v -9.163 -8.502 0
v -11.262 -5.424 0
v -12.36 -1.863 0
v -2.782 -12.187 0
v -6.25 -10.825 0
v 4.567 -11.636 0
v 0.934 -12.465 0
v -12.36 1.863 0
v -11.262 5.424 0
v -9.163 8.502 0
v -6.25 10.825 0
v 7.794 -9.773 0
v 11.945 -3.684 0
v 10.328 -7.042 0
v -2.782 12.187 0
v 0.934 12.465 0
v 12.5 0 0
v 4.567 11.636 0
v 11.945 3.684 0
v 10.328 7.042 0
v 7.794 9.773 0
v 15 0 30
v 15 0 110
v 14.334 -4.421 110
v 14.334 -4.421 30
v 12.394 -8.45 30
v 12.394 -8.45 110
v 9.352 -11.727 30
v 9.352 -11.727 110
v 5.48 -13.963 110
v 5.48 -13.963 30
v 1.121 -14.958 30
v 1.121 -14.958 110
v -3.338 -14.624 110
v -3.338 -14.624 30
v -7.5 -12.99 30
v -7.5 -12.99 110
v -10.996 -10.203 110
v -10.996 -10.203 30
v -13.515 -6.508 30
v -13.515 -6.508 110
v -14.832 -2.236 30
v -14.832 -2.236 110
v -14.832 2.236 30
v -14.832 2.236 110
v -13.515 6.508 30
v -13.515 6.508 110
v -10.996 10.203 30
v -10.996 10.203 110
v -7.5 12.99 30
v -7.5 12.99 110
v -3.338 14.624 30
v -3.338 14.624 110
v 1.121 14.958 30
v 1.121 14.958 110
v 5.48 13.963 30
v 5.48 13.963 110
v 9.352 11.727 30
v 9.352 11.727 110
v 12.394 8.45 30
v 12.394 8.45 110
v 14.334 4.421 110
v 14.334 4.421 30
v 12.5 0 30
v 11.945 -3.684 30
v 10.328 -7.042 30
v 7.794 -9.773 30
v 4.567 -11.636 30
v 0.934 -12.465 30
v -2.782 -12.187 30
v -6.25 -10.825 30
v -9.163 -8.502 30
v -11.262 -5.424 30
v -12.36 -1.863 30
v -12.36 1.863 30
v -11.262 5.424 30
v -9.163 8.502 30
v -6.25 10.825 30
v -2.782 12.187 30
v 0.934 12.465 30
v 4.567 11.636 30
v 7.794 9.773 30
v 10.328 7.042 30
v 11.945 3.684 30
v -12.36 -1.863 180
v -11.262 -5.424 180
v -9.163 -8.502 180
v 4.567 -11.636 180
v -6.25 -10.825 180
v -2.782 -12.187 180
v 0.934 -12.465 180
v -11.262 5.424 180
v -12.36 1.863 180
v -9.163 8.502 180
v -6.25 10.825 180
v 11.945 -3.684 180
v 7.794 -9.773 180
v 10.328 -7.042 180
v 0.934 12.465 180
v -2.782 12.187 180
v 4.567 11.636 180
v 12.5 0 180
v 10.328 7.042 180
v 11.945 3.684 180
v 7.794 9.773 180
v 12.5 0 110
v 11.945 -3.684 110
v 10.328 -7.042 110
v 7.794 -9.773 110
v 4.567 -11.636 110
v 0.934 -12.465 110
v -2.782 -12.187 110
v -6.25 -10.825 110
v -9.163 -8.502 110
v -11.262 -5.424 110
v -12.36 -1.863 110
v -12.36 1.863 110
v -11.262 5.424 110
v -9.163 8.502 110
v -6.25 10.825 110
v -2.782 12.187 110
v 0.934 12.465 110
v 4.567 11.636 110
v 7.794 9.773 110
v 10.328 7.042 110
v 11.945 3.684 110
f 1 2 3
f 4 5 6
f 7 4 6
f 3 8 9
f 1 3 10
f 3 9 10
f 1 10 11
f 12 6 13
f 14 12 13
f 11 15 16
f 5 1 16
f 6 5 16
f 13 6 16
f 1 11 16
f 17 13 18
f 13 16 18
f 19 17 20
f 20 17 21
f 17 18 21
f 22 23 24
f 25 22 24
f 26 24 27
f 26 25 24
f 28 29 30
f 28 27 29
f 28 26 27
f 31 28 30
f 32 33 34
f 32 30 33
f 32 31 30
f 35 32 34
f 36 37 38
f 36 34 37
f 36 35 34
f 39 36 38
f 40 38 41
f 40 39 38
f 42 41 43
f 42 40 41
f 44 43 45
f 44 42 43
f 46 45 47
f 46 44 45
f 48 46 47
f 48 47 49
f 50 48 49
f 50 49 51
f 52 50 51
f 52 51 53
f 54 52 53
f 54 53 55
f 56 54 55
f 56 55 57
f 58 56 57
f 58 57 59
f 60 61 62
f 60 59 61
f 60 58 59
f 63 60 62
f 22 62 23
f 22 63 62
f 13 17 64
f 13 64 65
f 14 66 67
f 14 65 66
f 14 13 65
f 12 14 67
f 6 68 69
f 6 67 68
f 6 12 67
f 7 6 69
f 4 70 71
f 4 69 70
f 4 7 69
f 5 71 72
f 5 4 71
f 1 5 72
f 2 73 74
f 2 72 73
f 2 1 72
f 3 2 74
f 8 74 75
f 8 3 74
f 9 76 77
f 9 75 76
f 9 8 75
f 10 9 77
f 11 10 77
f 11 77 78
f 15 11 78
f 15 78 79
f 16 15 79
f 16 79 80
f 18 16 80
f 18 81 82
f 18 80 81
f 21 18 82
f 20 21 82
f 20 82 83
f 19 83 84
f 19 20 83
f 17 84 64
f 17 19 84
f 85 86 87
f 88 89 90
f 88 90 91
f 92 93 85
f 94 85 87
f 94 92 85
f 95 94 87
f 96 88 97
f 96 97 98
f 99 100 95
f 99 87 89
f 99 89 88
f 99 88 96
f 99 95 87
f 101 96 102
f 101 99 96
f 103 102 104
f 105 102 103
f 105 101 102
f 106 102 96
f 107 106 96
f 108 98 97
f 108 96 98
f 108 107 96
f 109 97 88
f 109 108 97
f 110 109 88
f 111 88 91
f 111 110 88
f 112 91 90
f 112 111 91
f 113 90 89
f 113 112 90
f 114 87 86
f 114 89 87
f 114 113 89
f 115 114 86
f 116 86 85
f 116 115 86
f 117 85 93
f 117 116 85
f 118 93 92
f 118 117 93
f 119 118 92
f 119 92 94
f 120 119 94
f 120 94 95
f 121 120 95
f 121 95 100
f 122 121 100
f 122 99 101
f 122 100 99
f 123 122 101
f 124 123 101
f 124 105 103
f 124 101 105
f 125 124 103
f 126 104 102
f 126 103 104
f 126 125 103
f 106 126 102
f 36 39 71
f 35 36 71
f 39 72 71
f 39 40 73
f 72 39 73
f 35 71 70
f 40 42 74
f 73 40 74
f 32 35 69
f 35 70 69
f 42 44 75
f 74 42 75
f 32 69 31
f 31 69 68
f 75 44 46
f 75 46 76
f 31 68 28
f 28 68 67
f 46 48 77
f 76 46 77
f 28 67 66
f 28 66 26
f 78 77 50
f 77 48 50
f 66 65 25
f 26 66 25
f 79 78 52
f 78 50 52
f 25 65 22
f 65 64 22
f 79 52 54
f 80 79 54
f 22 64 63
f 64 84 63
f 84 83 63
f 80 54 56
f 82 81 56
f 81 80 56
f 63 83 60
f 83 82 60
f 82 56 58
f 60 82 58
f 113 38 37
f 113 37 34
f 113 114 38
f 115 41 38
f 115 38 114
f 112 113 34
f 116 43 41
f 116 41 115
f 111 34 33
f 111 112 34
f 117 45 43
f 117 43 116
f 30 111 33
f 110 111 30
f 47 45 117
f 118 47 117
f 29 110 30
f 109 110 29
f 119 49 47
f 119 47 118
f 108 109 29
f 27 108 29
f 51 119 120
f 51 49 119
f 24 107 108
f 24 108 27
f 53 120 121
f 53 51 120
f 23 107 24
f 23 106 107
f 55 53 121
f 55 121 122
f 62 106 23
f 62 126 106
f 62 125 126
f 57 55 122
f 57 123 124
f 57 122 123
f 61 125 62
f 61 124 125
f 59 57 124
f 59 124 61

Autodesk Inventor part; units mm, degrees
ref_plane "YZ Plane" through (0, 0, 0) normal (1, 0, 0) x (0, 1, 0)
ref_plane "XZ Plane" through (0, 0, 0) normal (0, 1, 0) x (-1, 0, 0)
ref_plane "XY Plane" through (0, 0, 0) normal (0, 0, 1) x (1, 0, 0)
sketch "Náčrt1" plane through (0, 0, 0) normal (0, 0, 1) x (1, 0, 0)
  circle A0 centre (0, 0) radius 12.5
  dimension "d0" = 25
extrude "Vysunutí1" add sketch "Náčrt1" along normal blind 30
sketch "Náčrt2" plane through (0, 0, 30) normal (0, 0, 1) x (1, 0, 0)
  circle A0 centre (0, 0) radius 15
  dimension "d3" = 30
extrude "Vysunutí2" add sketch "Náčrt2" along normal blind 80
sketch "Náčrt3" plane through (0, 0, 110) normal (0, 0, 1) x (1, 0, 0)
  circle A0 centre (0, 0) radius 12.5
  dimension "d6" = 25
extrude "Vysunutí3" add sketch "Náčrt3" along normal blind 70
sketch "Náčrt4" plane through (0, 0, 0) normal (1, 0, 0) x (0, 1, 0)
  point P0 (0, 0)
sketch "Náčrt5" plane through (0, 0, 0) normal (0, 1, 0) x (-1, 0, 0)
  line L0 (0, -36) -> (0, 216) construction
  arc A0 (-4, 38.6) -> (4, 38.6) centre (0, 38.6) ccw
  line L1 (-15, 30) -> (15, 30) construction
  arc A1 (4, 70.6) -> (-4, 70.6) centre (0, 70.6) ccw
  line L2 (4, 70.6) -> (4, 38.6)
  line L3 (-4, 70.6) -> (-4, 38.6)
  point P0 (0, 0)
  dimension "d9" = 8
  dimension "d10" = 8.6
  dimension "d11" = 8
  dimension "d12" = 32
properties part number "Součást3"
